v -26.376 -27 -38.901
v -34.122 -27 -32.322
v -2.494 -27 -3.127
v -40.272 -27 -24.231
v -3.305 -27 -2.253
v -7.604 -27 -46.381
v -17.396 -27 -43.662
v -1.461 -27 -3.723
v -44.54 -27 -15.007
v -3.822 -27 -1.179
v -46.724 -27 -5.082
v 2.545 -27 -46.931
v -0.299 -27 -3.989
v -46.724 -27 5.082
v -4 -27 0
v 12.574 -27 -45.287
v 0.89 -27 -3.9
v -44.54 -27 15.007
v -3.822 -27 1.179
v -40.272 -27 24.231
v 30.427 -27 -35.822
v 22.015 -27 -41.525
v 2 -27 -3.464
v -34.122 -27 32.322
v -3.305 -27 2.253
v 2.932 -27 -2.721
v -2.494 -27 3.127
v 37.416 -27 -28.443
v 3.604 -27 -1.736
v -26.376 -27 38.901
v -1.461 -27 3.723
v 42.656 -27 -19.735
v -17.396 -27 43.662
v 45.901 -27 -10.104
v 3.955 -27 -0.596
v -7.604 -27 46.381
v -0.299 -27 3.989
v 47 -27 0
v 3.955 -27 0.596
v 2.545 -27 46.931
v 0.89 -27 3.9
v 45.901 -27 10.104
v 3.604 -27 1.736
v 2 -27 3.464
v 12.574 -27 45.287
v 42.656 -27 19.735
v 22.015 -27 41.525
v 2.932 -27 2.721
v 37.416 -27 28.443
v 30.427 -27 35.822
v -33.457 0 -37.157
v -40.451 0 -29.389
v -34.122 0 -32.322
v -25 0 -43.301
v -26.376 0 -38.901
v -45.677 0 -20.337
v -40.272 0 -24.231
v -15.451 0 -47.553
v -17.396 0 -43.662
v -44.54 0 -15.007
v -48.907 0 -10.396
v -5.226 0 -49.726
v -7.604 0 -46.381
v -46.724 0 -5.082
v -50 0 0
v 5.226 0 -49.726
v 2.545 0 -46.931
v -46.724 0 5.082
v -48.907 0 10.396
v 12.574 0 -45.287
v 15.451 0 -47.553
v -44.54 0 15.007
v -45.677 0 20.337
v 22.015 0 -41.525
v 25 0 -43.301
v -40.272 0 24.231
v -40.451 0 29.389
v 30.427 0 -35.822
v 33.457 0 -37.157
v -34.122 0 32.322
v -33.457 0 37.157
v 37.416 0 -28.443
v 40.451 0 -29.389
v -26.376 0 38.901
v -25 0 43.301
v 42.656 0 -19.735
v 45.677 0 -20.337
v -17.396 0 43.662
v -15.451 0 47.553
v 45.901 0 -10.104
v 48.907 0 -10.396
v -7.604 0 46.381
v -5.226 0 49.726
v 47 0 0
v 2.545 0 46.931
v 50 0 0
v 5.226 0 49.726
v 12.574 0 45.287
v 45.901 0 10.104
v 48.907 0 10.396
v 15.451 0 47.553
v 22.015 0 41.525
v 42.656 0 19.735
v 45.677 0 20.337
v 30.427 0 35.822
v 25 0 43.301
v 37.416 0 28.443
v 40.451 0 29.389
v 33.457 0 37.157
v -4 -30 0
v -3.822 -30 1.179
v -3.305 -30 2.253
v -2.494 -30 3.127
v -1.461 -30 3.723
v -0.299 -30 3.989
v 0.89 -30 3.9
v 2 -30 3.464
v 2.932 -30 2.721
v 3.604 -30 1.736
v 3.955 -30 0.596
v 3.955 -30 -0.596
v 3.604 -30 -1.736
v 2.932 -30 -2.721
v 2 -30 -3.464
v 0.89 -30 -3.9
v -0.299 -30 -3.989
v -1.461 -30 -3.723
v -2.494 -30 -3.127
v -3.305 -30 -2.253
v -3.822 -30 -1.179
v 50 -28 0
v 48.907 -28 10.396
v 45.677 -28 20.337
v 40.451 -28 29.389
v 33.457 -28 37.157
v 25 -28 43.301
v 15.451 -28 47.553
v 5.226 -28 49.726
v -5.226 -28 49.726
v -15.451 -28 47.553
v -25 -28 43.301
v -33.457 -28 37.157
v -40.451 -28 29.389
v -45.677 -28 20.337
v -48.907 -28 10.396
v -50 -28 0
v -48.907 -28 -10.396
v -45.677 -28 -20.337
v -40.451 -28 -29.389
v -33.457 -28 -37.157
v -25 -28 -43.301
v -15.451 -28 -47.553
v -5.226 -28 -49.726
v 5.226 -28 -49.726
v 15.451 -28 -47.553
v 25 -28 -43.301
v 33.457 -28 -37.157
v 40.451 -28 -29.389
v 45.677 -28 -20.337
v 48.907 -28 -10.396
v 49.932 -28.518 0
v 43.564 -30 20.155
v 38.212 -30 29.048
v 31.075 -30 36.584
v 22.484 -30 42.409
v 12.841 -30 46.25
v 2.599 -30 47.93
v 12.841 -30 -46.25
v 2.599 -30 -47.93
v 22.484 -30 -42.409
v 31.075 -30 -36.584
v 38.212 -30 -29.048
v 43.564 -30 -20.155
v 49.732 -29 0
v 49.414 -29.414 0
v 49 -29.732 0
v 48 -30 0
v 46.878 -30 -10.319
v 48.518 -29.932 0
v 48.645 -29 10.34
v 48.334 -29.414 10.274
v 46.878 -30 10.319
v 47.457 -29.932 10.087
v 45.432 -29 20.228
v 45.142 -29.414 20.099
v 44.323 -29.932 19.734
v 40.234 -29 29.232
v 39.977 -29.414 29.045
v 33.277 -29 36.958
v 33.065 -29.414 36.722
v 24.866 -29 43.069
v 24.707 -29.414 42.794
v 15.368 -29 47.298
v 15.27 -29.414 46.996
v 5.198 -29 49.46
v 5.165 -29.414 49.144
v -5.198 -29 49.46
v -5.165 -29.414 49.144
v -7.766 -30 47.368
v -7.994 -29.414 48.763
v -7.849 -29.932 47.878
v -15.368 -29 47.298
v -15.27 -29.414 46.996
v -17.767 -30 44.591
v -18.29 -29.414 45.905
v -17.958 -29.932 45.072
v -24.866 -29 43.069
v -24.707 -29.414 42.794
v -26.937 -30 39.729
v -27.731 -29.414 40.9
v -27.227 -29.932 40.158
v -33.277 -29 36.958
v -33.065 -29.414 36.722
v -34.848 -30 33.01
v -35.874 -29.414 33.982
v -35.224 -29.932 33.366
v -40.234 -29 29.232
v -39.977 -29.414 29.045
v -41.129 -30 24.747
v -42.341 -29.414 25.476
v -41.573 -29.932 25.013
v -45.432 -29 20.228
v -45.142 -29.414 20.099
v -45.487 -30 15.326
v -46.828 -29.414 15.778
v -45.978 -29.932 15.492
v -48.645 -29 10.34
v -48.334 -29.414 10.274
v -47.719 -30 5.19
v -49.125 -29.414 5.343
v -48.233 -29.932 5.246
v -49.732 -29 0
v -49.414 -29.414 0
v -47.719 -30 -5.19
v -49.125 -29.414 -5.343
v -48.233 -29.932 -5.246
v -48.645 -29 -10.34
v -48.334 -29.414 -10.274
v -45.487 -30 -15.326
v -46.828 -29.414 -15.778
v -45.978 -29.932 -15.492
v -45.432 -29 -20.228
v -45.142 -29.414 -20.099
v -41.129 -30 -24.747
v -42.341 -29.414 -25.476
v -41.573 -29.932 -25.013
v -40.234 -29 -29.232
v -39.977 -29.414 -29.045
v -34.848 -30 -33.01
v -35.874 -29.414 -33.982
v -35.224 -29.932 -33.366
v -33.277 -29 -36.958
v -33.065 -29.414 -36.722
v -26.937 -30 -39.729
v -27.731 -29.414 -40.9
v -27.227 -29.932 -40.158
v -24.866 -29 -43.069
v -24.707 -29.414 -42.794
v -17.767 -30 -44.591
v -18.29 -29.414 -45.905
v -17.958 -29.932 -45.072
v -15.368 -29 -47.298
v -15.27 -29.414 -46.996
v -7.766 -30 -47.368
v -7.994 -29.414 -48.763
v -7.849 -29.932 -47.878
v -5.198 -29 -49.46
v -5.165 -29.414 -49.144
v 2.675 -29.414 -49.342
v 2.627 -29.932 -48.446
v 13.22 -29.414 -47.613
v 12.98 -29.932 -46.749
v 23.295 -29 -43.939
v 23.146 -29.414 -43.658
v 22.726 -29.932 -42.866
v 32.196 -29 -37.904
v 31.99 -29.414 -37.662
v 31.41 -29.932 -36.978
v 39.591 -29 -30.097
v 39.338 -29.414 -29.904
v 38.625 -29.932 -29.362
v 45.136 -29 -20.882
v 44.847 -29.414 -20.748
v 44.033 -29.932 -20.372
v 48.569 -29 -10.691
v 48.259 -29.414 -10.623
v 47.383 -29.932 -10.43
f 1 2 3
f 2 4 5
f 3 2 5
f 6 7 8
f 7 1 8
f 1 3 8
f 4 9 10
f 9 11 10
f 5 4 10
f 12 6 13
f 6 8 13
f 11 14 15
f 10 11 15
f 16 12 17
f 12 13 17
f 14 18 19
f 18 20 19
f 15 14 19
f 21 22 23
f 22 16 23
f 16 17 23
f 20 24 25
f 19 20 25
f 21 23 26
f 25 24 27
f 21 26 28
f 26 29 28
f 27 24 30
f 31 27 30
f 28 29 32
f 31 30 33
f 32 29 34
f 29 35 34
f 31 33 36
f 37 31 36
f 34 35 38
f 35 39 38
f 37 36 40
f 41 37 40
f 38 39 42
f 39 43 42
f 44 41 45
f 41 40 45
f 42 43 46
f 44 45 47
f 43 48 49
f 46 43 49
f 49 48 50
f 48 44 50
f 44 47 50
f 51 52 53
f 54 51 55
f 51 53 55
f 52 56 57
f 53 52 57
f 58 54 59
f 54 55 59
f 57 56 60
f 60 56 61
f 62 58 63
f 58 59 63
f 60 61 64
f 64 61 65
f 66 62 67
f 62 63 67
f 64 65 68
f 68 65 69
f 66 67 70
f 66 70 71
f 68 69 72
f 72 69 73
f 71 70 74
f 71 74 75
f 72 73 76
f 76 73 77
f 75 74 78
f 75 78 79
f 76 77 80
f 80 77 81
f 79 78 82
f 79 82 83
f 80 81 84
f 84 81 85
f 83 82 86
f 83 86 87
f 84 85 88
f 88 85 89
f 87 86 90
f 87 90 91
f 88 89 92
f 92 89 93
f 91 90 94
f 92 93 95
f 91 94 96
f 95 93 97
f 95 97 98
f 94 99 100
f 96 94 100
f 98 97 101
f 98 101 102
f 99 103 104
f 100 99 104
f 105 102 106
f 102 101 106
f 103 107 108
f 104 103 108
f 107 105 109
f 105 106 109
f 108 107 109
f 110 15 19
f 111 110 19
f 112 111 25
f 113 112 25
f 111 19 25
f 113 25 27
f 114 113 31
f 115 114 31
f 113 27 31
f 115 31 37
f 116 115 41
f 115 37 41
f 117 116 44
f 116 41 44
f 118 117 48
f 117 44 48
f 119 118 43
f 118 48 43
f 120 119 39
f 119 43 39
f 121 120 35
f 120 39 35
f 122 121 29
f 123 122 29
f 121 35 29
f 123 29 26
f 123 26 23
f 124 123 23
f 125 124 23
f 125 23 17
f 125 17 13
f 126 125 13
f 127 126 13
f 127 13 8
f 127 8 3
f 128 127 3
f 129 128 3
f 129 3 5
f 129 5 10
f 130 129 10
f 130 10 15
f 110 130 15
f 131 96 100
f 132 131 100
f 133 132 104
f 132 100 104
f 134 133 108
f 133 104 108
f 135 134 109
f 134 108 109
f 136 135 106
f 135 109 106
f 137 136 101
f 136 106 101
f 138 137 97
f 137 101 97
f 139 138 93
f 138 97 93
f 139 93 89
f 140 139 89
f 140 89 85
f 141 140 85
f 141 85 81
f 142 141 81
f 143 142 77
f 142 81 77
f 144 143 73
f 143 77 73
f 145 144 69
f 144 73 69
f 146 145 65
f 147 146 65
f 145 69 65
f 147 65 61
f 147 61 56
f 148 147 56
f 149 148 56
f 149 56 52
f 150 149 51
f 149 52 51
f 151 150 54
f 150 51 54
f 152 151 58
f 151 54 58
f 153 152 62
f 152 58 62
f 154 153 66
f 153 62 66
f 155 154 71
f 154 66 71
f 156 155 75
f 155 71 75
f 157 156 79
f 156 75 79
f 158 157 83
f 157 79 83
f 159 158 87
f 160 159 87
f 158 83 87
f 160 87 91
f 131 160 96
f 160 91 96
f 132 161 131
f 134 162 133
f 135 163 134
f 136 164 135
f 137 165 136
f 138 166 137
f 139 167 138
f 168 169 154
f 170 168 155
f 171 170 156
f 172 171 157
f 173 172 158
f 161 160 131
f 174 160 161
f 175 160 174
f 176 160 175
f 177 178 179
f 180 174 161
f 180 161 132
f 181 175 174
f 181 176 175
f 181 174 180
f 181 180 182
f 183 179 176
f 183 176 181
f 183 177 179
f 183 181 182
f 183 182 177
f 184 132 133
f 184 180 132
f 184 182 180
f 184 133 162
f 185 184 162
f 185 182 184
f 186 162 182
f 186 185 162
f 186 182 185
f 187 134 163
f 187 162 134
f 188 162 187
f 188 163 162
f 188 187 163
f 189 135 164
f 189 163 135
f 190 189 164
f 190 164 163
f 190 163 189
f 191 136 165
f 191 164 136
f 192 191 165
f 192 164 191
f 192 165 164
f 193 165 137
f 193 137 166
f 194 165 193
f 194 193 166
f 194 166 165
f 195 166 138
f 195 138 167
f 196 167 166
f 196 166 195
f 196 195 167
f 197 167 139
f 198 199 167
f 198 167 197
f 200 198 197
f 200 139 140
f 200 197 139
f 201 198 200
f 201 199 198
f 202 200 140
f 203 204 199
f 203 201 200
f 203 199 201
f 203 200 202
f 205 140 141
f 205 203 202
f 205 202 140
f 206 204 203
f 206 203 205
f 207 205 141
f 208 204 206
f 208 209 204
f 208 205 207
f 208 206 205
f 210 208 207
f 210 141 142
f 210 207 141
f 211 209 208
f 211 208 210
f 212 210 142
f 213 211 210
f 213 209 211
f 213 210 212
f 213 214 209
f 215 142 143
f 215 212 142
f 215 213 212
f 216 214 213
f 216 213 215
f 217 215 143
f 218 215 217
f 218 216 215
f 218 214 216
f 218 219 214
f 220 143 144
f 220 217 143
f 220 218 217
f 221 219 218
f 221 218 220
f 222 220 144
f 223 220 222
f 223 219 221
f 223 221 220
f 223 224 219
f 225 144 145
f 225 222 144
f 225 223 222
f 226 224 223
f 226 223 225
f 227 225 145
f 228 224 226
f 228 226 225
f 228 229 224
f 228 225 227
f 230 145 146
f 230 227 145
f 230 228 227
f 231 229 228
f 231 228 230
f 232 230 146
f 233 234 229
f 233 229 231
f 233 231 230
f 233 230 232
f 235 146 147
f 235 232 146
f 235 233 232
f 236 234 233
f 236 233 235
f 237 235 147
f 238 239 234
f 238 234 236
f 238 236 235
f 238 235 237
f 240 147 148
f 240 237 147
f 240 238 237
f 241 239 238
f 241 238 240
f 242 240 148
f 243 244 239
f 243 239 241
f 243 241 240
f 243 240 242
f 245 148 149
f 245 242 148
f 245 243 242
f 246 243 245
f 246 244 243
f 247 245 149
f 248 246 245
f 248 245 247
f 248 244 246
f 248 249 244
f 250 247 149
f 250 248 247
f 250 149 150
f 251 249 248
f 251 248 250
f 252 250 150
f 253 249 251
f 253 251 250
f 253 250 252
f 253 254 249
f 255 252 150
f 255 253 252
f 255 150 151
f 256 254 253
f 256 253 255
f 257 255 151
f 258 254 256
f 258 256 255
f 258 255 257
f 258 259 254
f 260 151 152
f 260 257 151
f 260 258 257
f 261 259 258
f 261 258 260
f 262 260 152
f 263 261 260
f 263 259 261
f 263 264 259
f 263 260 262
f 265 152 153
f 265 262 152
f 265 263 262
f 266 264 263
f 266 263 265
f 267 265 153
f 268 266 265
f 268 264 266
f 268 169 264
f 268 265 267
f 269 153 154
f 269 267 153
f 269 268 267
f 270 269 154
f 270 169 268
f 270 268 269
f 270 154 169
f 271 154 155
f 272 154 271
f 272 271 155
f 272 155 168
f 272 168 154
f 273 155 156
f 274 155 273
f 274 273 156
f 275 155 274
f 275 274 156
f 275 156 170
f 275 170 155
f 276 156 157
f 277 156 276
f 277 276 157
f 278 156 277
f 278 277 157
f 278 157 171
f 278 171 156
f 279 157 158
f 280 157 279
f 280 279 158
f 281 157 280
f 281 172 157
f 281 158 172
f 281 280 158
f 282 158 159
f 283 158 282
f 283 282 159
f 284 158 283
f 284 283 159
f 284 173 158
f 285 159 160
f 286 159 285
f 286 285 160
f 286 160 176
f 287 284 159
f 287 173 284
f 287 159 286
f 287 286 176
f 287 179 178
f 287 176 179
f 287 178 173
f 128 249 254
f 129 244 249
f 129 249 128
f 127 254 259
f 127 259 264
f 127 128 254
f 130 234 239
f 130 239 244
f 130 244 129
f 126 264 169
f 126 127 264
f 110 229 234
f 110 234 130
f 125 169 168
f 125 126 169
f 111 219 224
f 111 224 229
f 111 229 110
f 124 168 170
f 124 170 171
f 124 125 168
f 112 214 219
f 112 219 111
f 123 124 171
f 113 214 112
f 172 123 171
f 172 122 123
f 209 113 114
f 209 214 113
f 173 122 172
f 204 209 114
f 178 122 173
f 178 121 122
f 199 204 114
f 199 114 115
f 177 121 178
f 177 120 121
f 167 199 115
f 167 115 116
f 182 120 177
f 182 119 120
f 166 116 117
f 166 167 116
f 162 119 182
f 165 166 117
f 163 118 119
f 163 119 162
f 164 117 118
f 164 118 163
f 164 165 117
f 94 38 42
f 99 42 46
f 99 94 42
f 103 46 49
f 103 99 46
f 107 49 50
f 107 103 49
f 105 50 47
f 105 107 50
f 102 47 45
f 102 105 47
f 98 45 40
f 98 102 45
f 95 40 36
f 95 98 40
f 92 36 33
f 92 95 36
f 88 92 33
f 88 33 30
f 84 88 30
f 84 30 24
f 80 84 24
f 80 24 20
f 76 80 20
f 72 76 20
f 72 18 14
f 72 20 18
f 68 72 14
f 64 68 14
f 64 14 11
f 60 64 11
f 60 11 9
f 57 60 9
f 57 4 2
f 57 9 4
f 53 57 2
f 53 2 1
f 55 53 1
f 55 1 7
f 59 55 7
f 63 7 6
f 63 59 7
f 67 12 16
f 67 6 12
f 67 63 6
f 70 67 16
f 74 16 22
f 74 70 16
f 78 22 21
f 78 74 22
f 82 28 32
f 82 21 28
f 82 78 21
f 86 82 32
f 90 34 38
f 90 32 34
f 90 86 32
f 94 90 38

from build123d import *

# Parameters (mm, degrees)
F0_R     = 50
F1_DEPTH = 30
F2_T     = -3
F3_R     = 2
F5_D     = 8


with BuildPart() as f1:
    # F0 (on Front) → F1 (new body)
    with BuildSketch(Plane.XZ):
        Circle(F0_R)
    extrude(amount=F1_DEPTH)

    # F2
    f2_openings = [f1.faces().sort_by_distance(p)[0] for p in [
        (0, 0, 0),
    ]]
    offset(amount=F2_T, openings=f2_openings)

    # F3
    f3_edges = [f1.edges().sort_by_distance(p)[0] for p in [
        (-50, -30, 0),
    ]]
    fillet(f3_edges, radius=F3_R)

    # F5 (through all)
    with Locations(Plane.XZ.offset(30)):
        with Locations((0, 0)):
            Hole(F5_D / 2)


solid = f1.part
